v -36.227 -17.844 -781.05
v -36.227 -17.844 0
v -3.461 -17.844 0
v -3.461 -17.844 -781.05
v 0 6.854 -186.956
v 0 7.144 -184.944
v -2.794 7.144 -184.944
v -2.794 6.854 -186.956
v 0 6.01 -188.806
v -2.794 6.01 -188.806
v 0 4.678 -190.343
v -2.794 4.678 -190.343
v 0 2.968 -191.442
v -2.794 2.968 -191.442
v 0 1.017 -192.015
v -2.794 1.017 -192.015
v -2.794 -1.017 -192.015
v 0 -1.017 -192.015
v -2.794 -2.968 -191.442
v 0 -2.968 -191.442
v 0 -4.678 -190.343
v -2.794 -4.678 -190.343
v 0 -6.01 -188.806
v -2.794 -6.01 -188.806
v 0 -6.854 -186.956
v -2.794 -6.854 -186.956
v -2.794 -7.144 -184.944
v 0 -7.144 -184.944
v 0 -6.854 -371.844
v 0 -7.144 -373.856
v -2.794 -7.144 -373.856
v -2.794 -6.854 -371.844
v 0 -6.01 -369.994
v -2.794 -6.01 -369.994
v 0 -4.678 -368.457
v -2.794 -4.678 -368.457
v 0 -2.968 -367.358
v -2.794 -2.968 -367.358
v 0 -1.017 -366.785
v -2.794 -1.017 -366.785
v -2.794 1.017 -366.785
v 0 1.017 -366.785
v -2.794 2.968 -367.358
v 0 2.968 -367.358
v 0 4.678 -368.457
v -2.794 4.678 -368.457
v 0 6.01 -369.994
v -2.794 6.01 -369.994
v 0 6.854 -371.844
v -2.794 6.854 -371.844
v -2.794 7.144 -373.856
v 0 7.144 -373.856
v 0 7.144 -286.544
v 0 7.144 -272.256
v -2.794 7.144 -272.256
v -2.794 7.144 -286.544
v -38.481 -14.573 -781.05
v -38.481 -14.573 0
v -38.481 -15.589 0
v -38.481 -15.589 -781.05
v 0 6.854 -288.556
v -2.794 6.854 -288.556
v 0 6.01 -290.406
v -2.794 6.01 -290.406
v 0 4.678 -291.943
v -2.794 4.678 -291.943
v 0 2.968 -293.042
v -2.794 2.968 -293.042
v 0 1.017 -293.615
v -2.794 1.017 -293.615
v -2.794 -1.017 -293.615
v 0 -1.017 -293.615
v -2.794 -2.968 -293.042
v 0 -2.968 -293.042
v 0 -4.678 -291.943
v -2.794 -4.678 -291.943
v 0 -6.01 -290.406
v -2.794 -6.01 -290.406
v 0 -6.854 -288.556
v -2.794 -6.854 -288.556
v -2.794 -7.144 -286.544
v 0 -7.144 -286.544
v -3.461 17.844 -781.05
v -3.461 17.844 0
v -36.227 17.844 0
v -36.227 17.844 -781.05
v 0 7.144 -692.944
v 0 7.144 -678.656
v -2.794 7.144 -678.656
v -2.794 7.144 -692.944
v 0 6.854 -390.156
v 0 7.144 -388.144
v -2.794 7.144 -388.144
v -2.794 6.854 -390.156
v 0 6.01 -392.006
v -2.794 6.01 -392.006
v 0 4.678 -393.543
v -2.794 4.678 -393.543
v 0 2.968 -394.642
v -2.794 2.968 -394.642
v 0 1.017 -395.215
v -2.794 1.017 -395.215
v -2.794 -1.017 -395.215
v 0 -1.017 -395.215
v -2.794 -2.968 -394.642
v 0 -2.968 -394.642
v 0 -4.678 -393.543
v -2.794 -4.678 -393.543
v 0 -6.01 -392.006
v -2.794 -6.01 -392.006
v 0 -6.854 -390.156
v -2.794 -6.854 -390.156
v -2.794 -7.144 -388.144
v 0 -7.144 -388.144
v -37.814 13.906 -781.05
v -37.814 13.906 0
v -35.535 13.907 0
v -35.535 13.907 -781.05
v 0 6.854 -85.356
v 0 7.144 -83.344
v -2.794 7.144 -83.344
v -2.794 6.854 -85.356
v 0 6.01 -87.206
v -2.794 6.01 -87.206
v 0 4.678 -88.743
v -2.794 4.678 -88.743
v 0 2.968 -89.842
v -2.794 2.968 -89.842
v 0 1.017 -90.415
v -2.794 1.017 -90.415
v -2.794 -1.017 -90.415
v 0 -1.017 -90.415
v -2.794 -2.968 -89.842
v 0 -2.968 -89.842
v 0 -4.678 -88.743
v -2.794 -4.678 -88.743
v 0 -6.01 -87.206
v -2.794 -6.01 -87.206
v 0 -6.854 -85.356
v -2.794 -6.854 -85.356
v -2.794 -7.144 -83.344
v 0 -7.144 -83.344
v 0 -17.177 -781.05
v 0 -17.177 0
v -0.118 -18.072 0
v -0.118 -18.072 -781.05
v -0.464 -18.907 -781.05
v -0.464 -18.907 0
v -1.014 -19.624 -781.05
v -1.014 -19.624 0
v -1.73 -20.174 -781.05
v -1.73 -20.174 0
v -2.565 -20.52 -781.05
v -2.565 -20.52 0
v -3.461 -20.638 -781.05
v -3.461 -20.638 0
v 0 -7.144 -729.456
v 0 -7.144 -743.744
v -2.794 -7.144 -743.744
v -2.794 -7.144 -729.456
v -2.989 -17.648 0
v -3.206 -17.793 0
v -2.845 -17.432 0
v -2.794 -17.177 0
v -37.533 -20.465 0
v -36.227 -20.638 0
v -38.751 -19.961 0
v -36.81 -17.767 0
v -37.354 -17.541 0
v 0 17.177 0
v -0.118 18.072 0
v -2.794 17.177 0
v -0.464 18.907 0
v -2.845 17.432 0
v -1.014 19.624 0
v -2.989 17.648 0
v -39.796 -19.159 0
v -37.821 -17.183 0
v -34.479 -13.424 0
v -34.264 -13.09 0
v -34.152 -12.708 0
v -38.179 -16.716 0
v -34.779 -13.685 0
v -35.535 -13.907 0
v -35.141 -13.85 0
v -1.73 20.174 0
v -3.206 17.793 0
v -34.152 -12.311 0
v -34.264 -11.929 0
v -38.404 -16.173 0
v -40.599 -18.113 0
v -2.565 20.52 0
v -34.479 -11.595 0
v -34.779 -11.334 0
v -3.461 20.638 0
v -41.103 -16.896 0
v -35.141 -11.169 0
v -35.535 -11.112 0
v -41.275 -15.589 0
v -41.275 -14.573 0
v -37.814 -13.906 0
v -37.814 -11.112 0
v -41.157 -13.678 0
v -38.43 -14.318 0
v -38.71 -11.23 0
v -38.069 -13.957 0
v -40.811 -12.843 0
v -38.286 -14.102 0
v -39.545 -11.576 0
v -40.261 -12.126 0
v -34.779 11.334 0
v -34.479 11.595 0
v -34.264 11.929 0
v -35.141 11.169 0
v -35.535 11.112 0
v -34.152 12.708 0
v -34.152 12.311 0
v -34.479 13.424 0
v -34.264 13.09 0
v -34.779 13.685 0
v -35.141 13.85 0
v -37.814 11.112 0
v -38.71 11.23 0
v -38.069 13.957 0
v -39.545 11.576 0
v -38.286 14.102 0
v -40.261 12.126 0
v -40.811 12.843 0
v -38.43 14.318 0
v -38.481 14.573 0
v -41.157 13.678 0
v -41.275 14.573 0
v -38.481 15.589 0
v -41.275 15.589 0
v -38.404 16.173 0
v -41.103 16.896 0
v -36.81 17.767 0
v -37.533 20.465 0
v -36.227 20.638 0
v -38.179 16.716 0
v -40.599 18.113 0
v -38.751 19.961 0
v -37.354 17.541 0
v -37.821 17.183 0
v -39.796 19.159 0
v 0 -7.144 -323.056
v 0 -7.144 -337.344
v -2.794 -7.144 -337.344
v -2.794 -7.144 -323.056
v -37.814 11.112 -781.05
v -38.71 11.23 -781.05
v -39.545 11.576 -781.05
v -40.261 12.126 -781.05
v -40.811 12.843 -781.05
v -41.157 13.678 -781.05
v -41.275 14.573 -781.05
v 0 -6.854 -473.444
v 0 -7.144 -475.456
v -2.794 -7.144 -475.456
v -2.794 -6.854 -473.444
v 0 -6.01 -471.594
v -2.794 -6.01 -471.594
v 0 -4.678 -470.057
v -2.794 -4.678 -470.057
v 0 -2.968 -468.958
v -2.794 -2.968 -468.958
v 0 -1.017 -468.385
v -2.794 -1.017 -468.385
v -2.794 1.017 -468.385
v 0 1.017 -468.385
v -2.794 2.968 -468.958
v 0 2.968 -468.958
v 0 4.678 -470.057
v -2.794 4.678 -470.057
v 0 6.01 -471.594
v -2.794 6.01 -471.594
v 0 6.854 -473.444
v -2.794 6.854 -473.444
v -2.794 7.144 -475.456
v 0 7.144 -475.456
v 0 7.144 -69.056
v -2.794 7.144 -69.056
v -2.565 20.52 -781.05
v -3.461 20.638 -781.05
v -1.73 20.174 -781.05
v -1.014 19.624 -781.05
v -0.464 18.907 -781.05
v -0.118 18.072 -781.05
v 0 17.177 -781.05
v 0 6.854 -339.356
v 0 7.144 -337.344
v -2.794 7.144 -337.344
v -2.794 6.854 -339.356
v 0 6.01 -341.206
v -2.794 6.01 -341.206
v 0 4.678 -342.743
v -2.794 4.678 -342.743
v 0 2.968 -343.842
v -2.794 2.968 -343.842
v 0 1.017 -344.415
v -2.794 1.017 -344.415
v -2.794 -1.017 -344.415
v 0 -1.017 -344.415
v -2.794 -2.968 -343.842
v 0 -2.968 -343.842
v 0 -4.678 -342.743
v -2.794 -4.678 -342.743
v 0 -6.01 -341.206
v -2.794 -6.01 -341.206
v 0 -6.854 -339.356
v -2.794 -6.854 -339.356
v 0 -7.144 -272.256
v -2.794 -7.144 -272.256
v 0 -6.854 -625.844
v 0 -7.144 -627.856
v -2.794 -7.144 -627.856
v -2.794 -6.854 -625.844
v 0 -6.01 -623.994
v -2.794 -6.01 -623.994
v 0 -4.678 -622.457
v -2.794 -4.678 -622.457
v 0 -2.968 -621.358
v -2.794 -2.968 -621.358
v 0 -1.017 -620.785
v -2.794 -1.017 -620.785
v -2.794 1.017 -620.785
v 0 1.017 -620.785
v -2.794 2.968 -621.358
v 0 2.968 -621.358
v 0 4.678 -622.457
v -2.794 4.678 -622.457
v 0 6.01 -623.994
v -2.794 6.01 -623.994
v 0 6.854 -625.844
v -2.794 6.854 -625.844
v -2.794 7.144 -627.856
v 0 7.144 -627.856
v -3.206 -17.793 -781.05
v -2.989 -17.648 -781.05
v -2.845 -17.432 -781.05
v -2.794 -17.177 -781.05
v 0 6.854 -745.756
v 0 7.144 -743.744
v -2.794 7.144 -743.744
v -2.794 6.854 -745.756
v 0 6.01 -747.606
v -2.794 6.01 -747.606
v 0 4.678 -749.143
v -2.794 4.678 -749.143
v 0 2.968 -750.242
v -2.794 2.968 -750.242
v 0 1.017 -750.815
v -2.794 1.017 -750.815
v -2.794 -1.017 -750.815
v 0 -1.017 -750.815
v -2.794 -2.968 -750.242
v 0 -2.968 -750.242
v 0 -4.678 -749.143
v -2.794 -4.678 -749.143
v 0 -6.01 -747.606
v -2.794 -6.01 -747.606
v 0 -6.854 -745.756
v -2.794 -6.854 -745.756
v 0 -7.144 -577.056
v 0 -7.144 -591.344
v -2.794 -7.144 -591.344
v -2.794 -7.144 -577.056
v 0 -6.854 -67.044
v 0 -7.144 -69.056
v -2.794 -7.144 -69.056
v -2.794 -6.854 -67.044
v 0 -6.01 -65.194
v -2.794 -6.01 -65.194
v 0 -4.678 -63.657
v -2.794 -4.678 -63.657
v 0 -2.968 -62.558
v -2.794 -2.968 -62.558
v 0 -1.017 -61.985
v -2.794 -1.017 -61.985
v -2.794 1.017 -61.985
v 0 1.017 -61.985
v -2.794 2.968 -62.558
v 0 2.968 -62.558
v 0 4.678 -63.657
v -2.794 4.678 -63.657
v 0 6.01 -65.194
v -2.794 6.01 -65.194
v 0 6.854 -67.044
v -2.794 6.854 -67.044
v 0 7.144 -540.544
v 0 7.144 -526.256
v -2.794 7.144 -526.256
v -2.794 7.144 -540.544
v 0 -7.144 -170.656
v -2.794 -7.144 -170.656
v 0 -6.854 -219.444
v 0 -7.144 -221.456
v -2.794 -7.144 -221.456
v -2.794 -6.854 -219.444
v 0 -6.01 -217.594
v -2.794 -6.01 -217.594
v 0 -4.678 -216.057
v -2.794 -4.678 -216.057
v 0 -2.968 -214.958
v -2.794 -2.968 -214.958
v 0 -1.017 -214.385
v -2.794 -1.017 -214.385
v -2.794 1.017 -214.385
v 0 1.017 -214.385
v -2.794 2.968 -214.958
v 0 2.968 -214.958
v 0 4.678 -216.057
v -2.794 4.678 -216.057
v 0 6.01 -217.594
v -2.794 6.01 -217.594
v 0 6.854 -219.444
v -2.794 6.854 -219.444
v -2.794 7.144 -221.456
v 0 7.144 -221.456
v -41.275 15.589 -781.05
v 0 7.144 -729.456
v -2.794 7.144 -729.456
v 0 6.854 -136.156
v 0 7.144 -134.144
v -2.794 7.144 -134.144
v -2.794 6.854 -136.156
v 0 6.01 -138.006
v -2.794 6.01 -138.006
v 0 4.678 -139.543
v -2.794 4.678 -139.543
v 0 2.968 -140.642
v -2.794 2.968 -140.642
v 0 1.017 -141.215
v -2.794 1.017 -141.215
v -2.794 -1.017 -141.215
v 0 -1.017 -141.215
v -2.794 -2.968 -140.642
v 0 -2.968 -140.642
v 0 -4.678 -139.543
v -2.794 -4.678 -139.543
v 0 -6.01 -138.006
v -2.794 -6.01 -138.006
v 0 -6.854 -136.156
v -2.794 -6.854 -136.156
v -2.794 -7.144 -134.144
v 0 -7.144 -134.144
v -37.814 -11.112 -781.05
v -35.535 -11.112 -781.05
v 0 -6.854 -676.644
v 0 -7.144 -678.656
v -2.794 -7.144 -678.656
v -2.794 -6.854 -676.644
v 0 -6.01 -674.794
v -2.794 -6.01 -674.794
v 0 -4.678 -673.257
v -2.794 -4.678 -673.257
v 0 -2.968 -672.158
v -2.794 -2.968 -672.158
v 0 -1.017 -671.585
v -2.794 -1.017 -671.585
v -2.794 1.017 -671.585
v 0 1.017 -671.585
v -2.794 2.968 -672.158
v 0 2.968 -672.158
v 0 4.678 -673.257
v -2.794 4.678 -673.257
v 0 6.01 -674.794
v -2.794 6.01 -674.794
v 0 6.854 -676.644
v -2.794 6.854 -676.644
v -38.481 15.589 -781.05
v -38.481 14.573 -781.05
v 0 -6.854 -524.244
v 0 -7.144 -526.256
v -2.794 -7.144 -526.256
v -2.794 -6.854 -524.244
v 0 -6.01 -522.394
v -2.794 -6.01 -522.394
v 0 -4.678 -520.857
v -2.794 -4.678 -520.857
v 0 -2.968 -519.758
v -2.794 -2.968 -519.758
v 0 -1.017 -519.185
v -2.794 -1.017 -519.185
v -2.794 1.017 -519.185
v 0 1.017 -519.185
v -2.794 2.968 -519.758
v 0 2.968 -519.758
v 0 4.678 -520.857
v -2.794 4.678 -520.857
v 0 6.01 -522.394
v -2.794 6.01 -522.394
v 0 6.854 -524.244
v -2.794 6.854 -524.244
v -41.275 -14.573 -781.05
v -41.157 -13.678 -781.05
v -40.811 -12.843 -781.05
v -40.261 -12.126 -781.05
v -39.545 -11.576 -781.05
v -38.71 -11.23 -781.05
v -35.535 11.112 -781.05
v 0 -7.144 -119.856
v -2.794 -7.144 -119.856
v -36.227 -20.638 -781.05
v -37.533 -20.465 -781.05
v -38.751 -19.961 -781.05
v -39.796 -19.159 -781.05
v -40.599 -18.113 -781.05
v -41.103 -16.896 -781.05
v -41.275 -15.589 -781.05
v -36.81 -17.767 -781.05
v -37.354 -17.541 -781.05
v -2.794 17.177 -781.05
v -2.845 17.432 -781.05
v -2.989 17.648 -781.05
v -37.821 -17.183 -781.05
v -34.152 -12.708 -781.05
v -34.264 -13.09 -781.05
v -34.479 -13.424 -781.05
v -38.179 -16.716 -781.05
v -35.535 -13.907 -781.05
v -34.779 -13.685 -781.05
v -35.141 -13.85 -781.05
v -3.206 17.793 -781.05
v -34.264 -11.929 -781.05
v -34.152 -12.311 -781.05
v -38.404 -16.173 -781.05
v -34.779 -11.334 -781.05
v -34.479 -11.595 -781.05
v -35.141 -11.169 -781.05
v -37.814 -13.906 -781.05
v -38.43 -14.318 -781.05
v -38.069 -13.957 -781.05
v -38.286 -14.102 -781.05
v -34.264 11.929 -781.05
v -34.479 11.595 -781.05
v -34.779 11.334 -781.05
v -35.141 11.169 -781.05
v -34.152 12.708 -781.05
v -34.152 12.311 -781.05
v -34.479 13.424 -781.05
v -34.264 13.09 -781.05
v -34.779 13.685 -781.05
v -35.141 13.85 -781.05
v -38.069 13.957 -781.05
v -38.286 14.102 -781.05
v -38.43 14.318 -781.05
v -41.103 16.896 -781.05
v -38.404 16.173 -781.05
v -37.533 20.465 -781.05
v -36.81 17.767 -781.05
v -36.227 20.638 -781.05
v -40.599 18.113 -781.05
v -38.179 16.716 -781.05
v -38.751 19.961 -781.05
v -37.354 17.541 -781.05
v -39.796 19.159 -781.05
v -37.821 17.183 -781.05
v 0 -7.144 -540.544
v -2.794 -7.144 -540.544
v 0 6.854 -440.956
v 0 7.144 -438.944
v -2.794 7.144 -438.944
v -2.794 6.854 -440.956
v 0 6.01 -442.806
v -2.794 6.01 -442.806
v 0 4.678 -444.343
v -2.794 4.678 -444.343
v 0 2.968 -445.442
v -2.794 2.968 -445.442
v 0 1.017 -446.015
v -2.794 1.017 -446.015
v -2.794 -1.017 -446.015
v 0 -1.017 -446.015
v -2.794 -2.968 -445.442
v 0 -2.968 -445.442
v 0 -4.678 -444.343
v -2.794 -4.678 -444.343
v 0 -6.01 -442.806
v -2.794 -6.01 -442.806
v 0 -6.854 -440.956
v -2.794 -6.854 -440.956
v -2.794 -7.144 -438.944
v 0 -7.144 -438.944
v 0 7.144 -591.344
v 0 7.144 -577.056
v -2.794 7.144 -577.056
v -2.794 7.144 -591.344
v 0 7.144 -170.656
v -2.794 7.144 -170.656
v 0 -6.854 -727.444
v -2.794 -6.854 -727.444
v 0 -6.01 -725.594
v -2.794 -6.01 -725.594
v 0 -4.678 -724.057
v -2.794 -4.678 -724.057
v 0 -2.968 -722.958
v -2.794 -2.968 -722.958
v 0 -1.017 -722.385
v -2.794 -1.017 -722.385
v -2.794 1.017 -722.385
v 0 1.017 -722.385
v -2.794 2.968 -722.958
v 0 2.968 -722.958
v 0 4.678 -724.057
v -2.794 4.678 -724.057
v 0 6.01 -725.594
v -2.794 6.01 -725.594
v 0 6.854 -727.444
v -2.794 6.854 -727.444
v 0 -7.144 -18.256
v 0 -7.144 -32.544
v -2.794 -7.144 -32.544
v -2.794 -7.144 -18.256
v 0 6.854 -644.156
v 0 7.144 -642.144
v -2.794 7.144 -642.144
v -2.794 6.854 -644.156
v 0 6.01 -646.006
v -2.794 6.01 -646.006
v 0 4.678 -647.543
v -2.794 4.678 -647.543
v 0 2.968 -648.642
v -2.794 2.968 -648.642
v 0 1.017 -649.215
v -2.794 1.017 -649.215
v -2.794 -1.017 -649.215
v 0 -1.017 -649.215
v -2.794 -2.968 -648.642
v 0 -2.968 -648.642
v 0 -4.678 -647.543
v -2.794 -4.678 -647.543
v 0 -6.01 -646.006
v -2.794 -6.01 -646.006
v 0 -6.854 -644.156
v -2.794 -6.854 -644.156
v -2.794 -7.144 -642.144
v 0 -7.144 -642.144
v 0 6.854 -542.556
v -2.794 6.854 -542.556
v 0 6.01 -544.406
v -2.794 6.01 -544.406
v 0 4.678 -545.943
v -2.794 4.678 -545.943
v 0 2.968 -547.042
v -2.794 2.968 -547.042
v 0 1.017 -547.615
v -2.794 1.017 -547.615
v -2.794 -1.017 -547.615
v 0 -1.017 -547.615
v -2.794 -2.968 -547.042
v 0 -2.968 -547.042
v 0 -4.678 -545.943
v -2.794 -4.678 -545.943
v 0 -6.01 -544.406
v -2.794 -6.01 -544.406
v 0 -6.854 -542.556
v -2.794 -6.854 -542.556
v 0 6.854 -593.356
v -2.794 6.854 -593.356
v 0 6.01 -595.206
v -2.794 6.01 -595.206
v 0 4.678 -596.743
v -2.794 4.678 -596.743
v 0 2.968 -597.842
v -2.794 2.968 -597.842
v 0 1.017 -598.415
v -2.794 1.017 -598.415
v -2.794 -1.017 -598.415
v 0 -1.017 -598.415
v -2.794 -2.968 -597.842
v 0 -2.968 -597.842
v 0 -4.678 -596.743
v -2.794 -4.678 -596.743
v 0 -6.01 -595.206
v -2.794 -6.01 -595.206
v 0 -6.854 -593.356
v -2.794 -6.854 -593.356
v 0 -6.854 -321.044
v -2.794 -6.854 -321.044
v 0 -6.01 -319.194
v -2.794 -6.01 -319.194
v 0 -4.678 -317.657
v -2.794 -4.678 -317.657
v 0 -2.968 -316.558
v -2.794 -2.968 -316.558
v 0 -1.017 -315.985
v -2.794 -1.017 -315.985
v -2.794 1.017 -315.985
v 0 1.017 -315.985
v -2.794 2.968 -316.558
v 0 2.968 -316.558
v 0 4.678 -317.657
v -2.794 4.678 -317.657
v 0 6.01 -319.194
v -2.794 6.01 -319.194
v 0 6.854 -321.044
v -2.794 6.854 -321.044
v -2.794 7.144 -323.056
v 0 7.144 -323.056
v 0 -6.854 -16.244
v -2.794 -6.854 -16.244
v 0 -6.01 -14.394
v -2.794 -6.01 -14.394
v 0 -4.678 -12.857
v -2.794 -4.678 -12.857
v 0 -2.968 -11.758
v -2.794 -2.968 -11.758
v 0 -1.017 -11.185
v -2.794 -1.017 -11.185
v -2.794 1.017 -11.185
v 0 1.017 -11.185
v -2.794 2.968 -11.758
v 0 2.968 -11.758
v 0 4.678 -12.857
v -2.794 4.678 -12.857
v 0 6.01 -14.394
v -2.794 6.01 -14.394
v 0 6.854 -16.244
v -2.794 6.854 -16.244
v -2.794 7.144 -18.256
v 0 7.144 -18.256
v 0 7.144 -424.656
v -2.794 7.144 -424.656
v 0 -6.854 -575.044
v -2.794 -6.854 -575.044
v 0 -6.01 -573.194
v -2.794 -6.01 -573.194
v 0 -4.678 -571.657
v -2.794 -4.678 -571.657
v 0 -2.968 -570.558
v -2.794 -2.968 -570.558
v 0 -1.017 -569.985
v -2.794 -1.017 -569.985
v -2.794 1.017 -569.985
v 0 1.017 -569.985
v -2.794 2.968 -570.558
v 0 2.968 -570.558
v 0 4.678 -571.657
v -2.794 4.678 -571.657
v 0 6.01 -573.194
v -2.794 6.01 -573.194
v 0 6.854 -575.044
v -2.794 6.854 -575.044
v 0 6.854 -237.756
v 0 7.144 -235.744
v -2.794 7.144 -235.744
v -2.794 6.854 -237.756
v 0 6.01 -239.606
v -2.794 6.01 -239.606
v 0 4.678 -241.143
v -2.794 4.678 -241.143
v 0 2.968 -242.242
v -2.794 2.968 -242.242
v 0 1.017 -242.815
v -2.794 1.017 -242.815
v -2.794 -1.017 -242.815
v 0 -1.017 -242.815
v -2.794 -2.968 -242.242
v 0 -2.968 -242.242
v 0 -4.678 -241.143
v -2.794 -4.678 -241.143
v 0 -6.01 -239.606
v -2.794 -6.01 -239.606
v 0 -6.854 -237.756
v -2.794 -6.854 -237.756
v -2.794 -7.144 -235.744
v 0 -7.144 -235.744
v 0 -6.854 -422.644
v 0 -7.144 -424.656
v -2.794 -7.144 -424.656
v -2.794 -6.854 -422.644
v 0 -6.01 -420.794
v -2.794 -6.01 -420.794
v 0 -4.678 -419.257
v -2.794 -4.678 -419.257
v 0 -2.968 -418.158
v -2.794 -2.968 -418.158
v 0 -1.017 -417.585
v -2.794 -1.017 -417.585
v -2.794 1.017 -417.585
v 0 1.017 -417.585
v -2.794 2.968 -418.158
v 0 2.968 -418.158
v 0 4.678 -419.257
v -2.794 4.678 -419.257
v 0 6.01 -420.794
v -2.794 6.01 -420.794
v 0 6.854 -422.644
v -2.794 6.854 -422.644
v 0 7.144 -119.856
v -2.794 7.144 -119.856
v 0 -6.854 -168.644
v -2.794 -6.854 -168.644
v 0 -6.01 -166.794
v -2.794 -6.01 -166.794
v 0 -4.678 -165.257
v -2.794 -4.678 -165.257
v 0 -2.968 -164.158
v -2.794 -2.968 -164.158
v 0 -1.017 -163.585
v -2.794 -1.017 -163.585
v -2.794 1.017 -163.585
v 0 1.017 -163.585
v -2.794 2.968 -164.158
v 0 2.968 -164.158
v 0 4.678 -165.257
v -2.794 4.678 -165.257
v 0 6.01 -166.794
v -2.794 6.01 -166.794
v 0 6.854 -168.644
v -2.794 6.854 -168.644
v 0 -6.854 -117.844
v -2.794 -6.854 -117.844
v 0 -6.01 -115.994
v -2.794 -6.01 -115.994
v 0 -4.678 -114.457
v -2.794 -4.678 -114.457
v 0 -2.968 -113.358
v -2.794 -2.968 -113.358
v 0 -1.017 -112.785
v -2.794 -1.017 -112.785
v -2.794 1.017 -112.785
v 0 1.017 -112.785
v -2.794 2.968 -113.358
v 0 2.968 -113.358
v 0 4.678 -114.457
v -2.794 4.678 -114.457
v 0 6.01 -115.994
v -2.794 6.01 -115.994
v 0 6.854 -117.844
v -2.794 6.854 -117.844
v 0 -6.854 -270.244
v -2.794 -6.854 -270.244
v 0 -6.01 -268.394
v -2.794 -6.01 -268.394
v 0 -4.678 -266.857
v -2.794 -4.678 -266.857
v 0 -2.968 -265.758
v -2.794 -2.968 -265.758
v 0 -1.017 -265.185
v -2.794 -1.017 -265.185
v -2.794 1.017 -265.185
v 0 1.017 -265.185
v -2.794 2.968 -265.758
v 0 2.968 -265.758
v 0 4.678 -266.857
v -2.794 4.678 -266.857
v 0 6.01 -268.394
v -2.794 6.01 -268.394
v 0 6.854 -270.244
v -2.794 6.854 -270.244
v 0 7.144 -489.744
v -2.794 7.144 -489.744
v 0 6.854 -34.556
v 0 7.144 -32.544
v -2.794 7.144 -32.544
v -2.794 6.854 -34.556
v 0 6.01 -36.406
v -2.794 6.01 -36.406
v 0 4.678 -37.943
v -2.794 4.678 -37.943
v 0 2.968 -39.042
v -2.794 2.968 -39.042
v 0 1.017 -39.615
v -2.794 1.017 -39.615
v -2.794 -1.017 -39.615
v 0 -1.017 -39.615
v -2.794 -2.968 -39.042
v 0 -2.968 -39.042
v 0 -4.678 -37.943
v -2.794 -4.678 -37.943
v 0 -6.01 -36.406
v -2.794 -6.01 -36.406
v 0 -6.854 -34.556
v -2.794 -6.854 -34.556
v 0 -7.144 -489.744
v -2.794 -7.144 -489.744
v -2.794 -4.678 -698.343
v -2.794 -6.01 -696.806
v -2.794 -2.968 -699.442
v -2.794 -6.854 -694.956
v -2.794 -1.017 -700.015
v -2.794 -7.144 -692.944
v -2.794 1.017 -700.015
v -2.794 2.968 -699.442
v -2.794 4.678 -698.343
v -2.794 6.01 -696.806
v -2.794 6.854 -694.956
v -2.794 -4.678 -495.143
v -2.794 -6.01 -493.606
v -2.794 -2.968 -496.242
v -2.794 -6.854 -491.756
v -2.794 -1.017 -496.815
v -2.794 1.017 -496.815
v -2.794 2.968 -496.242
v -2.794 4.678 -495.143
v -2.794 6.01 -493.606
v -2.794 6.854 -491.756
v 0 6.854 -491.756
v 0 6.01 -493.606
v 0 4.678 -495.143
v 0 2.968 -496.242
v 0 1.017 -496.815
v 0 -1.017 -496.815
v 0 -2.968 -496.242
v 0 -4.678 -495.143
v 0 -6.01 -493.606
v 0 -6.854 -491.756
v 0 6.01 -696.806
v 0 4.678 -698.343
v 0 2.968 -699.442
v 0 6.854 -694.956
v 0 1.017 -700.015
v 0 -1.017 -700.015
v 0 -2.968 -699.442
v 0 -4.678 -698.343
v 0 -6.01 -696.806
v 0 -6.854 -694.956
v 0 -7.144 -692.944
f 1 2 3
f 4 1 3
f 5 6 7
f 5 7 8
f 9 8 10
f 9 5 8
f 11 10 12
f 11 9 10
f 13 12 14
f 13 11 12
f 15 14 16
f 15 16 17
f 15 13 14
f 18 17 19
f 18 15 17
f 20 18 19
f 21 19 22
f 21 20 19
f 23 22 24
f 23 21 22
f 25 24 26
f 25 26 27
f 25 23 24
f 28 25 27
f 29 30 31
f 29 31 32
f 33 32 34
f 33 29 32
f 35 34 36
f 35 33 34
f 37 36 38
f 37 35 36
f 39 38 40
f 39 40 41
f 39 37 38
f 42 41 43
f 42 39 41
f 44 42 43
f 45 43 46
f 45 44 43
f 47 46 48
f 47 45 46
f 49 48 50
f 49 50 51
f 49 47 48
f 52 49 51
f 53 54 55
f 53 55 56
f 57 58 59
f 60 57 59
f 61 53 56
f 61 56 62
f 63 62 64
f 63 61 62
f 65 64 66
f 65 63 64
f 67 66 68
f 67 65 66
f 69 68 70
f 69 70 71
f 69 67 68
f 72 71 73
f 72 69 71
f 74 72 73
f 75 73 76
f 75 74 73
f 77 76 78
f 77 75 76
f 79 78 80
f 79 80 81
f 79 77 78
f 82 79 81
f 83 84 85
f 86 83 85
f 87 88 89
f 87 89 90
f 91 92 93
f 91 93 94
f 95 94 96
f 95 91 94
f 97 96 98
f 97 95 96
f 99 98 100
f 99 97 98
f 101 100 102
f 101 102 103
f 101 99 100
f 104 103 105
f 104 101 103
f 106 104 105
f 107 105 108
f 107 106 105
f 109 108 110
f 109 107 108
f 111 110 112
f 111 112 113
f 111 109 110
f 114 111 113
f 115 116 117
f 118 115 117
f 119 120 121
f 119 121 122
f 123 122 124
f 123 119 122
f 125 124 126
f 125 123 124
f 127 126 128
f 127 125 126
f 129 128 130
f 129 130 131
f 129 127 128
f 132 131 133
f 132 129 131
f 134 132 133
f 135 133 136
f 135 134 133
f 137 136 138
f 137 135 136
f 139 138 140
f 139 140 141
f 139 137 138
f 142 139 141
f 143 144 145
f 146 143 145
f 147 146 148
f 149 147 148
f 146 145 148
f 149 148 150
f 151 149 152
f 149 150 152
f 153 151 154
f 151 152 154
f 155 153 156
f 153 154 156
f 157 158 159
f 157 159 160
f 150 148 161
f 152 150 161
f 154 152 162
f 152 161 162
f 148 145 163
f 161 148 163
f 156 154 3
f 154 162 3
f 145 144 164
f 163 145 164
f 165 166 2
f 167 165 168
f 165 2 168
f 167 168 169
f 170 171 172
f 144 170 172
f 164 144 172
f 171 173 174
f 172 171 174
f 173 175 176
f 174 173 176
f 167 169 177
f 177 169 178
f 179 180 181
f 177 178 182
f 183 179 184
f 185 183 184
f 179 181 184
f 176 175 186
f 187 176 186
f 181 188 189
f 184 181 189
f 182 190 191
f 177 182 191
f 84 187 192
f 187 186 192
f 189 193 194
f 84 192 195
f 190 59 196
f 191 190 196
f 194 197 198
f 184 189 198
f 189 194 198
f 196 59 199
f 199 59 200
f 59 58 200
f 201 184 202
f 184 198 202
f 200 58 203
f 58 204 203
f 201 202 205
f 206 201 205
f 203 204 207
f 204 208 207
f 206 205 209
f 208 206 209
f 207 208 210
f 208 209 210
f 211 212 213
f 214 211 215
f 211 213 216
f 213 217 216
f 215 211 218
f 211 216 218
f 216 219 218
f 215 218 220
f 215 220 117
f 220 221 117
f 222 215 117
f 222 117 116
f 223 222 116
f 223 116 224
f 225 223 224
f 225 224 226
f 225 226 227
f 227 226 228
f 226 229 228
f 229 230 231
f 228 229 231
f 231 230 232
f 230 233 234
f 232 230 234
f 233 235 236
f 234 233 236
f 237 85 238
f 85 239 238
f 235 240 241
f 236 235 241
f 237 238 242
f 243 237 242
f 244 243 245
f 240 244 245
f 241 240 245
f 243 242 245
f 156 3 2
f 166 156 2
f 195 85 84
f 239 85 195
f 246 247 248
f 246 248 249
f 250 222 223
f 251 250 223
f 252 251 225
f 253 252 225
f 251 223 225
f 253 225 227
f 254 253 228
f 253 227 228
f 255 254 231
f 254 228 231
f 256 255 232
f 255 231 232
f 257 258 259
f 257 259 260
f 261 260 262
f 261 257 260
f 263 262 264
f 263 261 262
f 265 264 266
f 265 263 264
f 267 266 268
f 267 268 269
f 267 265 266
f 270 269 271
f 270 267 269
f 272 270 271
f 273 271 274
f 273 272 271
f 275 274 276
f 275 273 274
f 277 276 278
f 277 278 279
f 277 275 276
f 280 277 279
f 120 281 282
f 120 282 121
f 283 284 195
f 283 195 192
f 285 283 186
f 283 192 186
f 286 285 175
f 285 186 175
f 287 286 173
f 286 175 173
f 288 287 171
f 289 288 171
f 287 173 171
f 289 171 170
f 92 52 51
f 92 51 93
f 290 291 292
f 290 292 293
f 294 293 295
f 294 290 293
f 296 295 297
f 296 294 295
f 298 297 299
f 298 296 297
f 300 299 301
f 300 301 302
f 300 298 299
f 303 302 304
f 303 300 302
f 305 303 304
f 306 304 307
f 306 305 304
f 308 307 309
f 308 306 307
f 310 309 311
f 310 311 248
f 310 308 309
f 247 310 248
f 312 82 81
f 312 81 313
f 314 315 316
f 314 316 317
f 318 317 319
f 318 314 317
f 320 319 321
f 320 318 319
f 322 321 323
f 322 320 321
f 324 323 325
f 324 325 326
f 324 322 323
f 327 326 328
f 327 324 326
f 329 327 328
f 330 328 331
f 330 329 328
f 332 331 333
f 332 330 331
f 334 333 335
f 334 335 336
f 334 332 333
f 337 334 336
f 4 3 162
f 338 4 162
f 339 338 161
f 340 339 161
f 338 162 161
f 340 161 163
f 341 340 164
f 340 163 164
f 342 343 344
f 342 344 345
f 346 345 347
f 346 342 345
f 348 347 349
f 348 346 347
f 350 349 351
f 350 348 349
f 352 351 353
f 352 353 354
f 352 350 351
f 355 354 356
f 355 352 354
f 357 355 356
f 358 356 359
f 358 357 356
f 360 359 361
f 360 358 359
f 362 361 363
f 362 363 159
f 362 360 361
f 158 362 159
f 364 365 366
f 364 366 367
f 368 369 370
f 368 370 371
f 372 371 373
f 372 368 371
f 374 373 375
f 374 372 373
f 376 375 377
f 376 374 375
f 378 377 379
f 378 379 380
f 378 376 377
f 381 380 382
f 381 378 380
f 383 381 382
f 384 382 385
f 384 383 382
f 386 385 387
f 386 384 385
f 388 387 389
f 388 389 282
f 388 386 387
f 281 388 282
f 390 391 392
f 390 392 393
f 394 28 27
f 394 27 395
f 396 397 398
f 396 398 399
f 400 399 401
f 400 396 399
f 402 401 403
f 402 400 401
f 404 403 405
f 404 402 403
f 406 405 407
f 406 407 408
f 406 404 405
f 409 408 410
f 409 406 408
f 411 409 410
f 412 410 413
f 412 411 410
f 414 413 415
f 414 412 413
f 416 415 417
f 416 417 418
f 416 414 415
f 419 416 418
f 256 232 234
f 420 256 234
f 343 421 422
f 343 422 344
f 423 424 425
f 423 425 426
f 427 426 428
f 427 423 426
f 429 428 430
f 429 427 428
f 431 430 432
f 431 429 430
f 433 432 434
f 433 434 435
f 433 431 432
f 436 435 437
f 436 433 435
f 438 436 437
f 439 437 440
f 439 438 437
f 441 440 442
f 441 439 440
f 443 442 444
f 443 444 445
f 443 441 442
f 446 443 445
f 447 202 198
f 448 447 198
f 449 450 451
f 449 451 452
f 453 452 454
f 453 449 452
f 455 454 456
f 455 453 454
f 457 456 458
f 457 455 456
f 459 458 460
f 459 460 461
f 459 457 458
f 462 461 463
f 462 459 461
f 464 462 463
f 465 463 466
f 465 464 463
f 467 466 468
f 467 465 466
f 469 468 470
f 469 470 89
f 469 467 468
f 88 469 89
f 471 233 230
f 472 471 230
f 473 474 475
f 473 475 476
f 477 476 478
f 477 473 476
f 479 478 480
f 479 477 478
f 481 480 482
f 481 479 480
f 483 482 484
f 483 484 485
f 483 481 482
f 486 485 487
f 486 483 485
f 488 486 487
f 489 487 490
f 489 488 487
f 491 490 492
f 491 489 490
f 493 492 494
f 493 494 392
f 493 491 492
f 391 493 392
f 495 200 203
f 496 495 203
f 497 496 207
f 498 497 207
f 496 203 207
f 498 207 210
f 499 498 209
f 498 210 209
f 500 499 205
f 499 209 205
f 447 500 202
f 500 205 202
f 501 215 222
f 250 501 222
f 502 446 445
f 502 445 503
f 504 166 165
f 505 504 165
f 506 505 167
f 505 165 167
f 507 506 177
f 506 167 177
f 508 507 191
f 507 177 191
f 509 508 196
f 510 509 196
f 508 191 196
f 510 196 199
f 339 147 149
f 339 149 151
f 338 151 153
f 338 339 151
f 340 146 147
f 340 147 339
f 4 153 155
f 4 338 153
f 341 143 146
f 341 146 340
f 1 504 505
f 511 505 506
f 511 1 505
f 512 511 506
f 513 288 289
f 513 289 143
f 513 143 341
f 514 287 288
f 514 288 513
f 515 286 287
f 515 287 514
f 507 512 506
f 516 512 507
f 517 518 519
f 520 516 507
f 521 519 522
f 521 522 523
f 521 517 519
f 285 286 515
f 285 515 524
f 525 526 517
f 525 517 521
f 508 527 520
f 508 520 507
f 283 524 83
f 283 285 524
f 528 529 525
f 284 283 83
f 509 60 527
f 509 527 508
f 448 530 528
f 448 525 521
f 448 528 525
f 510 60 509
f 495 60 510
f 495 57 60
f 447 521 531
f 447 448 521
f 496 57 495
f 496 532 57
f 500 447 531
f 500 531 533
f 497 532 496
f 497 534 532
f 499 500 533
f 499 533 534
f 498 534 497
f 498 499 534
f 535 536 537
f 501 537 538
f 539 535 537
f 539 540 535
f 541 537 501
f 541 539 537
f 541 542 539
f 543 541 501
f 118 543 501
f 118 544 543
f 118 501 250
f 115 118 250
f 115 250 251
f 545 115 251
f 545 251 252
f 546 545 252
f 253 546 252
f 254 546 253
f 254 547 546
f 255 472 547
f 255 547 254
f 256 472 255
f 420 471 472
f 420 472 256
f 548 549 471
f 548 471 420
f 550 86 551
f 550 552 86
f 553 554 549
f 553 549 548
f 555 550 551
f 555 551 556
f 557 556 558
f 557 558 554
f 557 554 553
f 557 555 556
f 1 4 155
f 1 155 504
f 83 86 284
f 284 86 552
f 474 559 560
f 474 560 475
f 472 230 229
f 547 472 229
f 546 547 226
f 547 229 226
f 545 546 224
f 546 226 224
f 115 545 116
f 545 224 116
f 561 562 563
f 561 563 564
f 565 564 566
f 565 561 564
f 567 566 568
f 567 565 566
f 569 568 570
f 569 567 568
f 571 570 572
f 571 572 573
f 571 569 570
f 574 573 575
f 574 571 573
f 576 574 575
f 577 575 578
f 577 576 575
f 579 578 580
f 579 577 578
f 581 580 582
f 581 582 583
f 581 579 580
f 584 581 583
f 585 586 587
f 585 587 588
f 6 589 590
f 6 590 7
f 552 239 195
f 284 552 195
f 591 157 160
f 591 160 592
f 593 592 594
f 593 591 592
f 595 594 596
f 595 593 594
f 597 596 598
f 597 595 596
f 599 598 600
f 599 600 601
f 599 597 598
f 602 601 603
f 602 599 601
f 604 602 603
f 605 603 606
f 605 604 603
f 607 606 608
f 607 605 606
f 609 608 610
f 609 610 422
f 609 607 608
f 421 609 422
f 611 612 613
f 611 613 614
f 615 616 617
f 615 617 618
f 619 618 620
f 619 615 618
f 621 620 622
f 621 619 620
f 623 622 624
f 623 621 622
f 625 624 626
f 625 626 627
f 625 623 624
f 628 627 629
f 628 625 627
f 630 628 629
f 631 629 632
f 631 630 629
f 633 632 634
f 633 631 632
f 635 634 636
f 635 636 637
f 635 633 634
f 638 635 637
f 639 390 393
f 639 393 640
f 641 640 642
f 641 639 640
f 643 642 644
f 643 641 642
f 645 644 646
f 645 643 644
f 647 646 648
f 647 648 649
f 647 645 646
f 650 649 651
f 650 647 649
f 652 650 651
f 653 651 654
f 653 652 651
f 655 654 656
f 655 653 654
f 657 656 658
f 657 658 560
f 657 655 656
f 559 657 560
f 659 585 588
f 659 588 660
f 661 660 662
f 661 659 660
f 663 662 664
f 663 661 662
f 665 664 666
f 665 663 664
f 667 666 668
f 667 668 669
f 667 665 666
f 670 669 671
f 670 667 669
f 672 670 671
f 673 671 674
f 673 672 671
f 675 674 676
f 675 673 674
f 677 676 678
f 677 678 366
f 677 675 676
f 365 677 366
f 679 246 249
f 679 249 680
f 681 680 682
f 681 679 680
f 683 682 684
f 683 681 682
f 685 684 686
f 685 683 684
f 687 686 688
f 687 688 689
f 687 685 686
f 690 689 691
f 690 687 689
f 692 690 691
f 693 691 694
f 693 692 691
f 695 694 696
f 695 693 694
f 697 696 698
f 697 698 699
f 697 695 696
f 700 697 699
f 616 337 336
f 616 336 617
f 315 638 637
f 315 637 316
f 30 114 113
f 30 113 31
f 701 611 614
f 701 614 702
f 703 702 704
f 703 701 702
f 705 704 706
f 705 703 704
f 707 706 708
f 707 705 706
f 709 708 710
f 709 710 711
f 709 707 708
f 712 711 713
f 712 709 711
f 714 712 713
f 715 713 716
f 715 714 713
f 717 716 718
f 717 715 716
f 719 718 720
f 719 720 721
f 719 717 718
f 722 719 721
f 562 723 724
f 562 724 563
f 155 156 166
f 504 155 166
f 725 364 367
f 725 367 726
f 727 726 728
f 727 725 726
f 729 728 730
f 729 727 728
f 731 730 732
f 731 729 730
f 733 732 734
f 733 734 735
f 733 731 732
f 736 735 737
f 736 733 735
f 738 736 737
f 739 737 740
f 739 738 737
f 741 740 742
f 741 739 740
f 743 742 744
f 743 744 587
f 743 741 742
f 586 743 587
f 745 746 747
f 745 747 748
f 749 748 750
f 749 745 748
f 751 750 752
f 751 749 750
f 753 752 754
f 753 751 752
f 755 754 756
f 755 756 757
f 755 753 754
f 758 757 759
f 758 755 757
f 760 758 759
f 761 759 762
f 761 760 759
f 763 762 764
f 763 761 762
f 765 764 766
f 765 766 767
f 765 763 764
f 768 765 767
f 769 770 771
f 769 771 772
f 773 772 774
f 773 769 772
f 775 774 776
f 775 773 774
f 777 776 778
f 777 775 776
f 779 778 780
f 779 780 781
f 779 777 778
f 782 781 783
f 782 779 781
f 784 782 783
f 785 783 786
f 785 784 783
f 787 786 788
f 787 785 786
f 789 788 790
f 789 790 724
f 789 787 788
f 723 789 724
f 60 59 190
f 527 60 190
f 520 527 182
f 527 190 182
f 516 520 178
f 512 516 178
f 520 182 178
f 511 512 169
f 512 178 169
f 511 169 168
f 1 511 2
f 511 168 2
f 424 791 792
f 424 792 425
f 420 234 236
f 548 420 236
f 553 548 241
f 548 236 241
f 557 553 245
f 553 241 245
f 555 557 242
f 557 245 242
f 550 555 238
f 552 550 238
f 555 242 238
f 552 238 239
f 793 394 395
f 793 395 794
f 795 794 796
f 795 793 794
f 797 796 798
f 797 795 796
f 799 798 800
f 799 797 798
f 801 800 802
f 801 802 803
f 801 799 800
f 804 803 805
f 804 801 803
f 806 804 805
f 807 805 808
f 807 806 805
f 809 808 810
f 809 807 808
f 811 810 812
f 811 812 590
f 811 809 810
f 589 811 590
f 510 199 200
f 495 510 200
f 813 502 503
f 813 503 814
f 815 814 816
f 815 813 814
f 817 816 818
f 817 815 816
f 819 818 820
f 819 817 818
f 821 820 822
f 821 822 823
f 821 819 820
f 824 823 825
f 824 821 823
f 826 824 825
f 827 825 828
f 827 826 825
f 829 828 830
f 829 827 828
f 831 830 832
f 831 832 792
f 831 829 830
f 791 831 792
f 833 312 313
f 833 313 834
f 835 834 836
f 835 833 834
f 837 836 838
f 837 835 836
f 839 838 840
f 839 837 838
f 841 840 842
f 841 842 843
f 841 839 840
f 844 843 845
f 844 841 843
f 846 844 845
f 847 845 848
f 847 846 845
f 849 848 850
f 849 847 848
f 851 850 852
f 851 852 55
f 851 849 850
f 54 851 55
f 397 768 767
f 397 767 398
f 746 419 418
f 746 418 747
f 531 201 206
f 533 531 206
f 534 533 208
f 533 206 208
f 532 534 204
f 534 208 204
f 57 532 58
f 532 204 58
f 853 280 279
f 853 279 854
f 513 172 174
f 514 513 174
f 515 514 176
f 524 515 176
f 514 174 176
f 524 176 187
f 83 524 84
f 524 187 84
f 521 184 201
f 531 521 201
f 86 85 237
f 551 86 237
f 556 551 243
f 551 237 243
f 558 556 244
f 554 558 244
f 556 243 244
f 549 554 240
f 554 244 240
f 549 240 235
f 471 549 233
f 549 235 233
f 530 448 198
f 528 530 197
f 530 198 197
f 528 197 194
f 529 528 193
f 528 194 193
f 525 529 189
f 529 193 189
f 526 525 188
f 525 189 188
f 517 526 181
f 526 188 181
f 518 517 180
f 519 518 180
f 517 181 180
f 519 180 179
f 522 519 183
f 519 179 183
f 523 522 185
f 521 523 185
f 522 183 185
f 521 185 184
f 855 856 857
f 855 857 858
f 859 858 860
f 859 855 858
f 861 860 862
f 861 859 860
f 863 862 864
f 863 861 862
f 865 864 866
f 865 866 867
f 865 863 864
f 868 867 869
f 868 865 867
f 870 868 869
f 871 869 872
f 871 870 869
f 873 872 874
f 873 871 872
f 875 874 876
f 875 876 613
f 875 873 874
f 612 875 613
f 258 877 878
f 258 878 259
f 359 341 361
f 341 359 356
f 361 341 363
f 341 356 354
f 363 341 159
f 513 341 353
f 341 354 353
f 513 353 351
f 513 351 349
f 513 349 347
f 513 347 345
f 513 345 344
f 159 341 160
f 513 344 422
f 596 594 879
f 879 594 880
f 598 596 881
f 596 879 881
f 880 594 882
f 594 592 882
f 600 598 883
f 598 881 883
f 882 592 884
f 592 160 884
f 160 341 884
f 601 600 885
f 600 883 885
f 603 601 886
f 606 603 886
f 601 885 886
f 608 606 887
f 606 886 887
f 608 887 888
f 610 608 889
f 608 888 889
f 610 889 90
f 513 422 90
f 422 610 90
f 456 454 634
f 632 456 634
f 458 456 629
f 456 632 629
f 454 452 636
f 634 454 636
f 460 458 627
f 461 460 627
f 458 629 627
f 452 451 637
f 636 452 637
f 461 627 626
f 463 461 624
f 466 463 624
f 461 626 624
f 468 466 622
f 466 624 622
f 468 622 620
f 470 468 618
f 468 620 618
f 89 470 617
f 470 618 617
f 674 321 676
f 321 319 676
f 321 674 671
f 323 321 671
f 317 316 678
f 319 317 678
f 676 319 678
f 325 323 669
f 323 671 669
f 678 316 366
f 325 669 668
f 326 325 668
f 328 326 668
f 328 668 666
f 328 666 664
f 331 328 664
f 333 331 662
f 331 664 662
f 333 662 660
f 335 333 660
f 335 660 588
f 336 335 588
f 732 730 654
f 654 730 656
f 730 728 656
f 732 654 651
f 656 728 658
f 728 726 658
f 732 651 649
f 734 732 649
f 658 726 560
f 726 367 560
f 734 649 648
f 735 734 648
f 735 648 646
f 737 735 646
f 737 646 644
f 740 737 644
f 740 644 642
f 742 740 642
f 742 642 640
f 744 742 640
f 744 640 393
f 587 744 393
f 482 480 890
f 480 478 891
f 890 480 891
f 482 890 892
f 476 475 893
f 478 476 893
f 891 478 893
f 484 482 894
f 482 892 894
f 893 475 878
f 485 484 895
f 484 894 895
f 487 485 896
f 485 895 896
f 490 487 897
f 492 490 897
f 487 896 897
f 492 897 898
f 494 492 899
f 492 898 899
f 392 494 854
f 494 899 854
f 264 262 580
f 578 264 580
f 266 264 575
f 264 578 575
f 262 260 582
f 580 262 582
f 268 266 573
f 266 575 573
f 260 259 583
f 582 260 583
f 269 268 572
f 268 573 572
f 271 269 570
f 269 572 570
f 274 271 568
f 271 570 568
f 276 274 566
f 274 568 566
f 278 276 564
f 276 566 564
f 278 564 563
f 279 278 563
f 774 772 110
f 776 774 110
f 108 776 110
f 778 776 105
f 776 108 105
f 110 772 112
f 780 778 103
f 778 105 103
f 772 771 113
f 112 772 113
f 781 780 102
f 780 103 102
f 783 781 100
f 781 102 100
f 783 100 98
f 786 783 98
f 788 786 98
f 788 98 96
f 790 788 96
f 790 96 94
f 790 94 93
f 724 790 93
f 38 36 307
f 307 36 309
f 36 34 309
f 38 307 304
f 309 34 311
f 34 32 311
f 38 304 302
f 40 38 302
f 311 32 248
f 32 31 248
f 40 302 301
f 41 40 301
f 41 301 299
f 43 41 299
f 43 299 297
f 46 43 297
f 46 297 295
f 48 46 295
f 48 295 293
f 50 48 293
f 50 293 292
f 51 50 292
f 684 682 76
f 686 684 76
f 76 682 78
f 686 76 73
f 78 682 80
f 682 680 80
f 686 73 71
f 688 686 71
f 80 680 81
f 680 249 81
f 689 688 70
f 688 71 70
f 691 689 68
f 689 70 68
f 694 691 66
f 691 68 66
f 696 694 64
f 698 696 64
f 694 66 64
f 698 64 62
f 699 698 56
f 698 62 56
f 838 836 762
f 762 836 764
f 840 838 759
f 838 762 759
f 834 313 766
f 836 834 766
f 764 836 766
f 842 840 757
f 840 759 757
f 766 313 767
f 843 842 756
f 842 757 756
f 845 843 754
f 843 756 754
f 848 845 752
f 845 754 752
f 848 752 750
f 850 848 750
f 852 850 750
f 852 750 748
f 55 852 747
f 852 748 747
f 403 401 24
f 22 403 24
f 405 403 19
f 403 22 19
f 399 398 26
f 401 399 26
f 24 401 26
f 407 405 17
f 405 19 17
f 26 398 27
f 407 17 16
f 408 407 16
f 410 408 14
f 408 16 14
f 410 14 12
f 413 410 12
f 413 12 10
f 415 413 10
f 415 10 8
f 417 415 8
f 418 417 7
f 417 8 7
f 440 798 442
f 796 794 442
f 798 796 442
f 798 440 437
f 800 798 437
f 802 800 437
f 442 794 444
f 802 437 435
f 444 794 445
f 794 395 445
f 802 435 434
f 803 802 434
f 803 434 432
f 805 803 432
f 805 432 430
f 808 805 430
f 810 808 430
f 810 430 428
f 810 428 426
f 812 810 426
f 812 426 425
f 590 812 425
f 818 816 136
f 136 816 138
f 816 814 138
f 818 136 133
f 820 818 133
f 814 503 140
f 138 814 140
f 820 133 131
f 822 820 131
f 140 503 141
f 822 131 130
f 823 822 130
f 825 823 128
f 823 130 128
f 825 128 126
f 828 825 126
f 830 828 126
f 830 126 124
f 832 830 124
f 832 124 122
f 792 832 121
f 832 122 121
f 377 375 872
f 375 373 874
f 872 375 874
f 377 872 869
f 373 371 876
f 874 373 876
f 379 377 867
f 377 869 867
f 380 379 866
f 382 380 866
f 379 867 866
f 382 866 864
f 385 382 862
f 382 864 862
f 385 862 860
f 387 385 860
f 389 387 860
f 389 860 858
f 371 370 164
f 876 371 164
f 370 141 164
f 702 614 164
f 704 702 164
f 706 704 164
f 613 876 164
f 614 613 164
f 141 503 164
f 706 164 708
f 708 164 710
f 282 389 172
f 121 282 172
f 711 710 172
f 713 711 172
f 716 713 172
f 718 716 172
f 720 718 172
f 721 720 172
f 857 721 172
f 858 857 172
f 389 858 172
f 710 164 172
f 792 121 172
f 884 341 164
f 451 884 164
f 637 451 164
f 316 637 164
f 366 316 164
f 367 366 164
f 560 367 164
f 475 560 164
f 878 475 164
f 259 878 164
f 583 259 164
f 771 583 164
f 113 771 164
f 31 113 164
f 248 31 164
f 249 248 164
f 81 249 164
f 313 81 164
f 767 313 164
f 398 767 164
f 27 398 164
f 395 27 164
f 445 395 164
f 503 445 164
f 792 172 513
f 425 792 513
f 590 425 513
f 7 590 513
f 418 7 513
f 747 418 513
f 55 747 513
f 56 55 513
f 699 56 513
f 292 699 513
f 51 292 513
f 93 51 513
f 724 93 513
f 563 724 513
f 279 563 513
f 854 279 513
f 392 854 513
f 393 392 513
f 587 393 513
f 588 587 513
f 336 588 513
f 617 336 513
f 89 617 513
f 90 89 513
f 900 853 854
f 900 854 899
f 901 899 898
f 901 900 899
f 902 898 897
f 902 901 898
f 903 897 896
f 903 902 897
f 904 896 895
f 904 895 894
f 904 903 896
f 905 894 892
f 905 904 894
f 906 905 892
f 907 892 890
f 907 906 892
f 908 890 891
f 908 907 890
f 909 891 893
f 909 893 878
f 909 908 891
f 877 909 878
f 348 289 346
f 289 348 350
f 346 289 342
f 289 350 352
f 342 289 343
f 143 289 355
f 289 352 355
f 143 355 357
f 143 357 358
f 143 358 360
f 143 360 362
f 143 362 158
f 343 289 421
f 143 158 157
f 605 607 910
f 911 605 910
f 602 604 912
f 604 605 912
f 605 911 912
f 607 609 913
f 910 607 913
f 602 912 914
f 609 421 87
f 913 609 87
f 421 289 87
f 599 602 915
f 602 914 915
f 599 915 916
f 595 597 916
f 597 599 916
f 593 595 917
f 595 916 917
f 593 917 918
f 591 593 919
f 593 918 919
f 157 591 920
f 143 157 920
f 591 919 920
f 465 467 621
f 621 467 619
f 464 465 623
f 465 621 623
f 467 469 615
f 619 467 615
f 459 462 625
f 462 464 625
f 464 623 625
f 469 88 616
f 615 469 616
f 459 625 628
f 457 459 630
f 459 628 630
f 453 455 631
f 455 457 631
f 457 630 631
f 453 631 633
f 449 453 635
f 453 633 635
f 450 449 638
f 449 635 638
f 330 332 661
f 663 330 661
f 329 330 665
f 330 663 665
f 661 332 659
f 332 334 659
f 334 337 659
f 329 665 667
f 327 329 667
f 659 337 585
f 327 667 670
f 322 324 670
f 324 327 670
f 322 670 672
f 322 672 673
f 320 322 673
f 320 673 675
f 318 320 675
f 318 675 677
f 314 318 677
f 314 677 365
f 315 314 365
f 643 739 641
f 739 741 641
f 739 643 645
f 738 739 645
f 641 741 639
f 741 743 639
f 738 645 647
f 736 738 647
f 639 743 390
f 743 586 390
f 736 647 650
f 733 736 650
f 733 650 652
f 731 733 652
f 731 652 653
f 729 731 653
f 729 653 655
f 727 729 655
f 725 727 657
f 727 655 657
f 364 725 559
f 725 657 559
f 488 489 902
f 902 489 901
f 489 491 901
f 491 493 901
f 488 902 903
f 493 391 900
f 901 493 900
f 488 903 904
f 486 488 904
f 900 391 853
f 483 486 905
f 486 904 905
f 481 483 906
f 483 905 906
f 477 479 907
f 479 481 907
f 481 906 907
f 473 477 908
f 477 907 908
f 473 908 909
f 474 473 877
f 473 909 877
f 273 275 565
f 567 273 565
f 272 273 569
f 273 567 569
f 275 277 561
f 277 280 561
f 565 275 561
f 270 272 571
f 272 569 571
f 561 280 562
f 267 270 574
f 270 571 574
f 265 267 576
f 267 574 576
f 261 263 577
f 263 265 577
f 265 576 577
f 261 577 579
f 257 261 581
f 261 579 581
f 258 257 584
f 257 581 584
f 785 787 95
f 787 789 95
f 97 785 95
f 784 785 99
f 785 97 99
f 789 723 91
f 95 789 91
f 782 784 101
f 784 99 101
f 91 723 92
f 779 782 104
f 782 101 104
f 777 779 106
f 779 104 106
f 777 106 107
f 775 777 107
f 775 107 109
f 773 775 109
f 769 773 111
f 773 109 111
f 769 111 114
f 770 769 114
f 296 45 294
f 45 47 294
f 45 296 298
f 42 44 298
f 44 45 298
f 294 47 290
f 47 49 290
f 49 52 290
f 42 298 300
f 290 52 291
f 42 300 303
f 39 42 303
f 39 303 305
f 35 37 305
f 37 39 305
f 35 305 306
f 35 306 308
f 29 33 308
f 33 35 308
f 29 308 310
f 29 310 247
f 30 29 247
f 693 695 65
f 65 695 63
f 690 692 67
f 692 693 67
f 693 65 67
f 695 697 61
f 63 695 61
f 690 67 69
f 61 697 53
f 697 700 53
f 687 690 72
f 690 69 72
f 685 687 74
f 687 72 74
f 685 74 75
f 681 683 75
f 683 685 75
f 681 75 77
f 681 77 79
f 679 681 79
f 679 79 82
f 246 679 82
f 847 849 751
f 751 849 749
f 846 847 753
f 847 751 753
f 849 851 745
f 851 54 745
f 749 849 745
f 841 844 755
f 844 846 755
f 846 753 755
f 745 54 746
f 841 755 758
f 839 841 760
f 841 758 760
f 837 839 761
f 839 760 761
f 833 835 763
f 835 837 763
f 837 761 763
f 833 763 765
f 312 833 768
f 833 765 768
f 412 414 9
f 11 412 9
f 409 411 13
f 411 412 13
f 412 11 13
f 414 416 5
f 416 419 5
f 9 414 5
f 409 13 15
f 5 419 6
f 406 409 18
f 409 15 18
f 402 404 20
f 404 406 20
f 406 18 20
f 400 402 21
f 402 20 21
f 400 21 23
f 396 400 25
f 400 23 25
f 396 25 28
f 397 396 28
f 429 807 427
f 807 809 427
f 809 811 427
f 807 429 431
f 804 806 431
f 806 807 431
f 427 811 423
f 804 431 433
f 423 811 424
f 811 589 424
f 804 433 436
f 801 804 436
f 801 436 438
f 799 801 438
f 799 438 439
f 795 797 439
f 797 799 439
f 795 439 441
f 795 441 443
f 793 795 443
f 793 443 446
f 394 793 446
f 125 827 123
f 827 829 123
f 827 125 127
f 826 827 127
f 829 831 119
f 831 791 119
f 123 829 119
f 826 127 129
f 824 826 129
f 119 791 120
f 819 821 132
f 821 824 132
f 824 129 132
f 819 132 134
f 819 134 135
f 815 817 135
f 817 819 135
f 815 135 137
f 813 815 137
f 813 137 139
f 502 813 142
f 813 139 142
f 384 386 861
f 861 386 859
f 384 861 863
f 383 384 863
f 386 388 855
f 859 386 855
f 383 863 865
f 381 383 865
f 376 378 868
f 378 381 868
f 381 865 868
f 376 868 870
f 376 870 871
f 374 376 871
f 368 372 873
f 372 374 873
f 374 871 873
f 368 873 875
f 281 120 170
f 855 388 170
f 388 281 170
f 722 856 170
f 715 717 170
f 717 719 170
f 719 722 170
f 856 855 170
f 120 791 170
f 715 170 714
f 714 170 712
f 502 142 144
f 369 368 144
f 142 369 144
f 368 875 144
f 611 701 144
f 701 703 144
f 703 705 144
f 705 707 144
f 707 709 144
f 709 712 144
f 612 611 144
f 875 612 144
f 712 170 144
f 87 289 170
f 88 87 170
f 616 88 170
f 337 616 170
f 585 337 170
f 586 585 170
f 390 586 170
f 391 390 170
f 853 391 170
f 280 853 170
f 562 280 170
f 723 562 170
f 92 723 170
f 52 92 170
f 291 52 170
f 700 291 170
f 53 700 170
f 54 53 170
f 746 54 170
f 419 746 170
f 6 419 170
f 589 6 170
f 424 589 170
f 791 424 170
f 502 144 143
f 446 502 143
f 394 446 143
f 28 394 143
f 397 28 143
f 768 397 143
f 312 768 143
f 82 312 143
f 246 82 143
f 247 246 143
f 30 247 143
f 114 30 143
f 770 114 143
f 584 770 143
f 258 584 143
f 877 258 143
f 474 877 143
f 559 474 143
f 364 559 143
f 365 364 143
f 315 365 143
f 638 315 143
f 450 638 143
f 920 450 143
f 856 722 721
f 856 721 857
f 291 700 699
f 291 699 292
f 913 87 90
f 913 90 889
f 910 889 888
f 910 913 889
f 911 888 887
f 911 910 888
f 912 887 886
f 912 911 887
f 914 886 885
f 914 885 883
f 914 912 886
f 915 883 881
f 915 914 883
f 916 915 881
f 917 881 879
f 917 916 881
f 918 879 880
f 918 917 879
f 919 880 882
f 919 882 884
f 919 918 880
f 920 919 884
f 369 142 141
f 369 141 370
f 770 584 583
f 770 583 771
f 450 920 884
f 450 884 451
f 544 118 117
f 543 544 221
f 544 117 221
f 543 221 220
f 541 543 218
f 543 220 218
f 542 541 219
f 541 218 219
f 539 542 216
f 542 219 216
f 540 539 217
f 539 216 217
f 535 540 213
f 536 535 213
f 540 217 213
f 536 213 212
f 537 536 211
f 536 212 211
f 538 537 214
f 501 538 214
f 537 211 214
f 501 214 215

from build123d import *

# Parameters (mm, degrees)
BOSS_EXTRUDE1_DEPTH = 781.05
CUT_EXTRUDE1_DEPTH  = 2.794
LPATTERN1_COUNT     = 15
LPATTERN1_PITCH     = 50.8


with BuildPart() as part:
    # Sketch1 → Boss-Extrude1 (new body)
    with BuildSketch(Plane.XY):
        with BuildLine():
            Line((-36.22675, 20.6375), (-3.46075, 20.6375))
            ThreePointArc((-3.46075, 20.6375), (-1.013630207, 19.623869793), (0, 17.17675))
            Line((0, 17.17675), (0, -17.17675))
            ThreePointArc((0, -17.17675), (-1.013630207, -19.623869793), (-3.46075, -20.6375))
            Line((-3.46075, -20.6375), (-36.22675, -20.6375))
            ThreePointArc((-36.22675, -20.6375), (-39.796401808, -19.158901808), (-41.275, -15.58925))
            Line((-41.275, -15.58925), (-41.275, -14.57325))
            ThreePointArc((-41.275, -14.57325), (-40.261369793, -12.126130207), (-37.81425, -11.1125))
            Line((-37.81425, -11.1125), (-35.5346, -11.1125))
            ThreePointArc((-35.5346, -11.1125), (-34.1376, -12.5095), (-35.5346, -13.9065))
            Line((-35.5346, -13.9065), (-37.81425, -13.9065))
            ThreePointArc((-37.81425, -13.9065), (-38.285713446, -14.101786554), (-38.481, -14.57325))
            Line((-38.481, -14.57325), (-38.481, -15.58925))
            ThreePointArc((-38.481, -15.58925), (-37.820745461, -17.183245461), (-36.22675, -17.8435))
            Line((-36.22675, -17.8435), (-3.46075, -17.8435))
            ThreePointArc((-3.46075, -17.8435), (-2.989286554, -17.648213446), (-2.794, -17.17675))
            Line((-2.794, -17.17675), (-2.794, 17.17675))
            ThreePointArc((-2.794, 17.17675), (-2.989286554, 17.648213446), (-3.46075, 17.8435))
            Line((-3.46075, 17.8435), (-36.22675, 17.8435))
            ThreePointArc((-36.22675, 17.8435), (-37.820745461, 17.183245461), (-38.481, 15.58925))
            Line((-38.481, 15.58925), (-38.481, 14.57325))
            ThreePointArc((-38.481, 14.57325), (-38.285713446, 14.101786554), (-37.81425, 13.9065))
            Line((-37.81425, 13.9065), (-35.5346, 13.9065))
            ThreePointArc((-35.5346, 13.9065), (-34.1376, 12.5095), (-35.5346, 11.1125))
            Line((-35.5346, 11.1125), (-37.81425, 11.1125))
            ThreePointArc((-37.81425, 11.1125), (-40.261369793, 12.126130207), (-41.275, 14.57325))
            Line((-41.275, 14.57325), (-41.275, 15.58925))
            ThreePointArc((-41.275, 15.58925), (-39.796401808, 19.158901808), (-36.22675, 20.6375))
        make_face()
    extrude(amount=-BOSS_EXTRUDE1_DEPTH)

    # Sketch2 → Cut-Extrude1 (cut)
    with BuildSketch(Plane(origin=(0, 0, 0), x_dir=(0, 0, -1), z_dir=(1, 0, 0))):
        with BuildLine():
            Line((18.25625, 7.14375), (32.54375, 7.14375))
            ThreePointArc((32.54375, 7.14375), (39.6875, 0), (32.54375, -7.14375))
            Line((32.54375, -7.14375), (18.25625, -7.14375))
            ThreePointArc((18.25625, -7.14375), (11.1125, 0), (18.25625, 7.14375))
        make_face()
    cut_extrude1 = extrude(amount=-CUT_EXTRUDE1_DEPTH, mode=Mode.SUBTRACT)

    # LPattern1: Cut-Extrude1 ×15
    with Locations(*[(0, 0, -i * LPATTERN1_PITCH) for i in range(1, LPATTERN1_COUNT)]):
        add(cut_extrude1, mode=Mode.SUBTRACT)


solid = part.part
